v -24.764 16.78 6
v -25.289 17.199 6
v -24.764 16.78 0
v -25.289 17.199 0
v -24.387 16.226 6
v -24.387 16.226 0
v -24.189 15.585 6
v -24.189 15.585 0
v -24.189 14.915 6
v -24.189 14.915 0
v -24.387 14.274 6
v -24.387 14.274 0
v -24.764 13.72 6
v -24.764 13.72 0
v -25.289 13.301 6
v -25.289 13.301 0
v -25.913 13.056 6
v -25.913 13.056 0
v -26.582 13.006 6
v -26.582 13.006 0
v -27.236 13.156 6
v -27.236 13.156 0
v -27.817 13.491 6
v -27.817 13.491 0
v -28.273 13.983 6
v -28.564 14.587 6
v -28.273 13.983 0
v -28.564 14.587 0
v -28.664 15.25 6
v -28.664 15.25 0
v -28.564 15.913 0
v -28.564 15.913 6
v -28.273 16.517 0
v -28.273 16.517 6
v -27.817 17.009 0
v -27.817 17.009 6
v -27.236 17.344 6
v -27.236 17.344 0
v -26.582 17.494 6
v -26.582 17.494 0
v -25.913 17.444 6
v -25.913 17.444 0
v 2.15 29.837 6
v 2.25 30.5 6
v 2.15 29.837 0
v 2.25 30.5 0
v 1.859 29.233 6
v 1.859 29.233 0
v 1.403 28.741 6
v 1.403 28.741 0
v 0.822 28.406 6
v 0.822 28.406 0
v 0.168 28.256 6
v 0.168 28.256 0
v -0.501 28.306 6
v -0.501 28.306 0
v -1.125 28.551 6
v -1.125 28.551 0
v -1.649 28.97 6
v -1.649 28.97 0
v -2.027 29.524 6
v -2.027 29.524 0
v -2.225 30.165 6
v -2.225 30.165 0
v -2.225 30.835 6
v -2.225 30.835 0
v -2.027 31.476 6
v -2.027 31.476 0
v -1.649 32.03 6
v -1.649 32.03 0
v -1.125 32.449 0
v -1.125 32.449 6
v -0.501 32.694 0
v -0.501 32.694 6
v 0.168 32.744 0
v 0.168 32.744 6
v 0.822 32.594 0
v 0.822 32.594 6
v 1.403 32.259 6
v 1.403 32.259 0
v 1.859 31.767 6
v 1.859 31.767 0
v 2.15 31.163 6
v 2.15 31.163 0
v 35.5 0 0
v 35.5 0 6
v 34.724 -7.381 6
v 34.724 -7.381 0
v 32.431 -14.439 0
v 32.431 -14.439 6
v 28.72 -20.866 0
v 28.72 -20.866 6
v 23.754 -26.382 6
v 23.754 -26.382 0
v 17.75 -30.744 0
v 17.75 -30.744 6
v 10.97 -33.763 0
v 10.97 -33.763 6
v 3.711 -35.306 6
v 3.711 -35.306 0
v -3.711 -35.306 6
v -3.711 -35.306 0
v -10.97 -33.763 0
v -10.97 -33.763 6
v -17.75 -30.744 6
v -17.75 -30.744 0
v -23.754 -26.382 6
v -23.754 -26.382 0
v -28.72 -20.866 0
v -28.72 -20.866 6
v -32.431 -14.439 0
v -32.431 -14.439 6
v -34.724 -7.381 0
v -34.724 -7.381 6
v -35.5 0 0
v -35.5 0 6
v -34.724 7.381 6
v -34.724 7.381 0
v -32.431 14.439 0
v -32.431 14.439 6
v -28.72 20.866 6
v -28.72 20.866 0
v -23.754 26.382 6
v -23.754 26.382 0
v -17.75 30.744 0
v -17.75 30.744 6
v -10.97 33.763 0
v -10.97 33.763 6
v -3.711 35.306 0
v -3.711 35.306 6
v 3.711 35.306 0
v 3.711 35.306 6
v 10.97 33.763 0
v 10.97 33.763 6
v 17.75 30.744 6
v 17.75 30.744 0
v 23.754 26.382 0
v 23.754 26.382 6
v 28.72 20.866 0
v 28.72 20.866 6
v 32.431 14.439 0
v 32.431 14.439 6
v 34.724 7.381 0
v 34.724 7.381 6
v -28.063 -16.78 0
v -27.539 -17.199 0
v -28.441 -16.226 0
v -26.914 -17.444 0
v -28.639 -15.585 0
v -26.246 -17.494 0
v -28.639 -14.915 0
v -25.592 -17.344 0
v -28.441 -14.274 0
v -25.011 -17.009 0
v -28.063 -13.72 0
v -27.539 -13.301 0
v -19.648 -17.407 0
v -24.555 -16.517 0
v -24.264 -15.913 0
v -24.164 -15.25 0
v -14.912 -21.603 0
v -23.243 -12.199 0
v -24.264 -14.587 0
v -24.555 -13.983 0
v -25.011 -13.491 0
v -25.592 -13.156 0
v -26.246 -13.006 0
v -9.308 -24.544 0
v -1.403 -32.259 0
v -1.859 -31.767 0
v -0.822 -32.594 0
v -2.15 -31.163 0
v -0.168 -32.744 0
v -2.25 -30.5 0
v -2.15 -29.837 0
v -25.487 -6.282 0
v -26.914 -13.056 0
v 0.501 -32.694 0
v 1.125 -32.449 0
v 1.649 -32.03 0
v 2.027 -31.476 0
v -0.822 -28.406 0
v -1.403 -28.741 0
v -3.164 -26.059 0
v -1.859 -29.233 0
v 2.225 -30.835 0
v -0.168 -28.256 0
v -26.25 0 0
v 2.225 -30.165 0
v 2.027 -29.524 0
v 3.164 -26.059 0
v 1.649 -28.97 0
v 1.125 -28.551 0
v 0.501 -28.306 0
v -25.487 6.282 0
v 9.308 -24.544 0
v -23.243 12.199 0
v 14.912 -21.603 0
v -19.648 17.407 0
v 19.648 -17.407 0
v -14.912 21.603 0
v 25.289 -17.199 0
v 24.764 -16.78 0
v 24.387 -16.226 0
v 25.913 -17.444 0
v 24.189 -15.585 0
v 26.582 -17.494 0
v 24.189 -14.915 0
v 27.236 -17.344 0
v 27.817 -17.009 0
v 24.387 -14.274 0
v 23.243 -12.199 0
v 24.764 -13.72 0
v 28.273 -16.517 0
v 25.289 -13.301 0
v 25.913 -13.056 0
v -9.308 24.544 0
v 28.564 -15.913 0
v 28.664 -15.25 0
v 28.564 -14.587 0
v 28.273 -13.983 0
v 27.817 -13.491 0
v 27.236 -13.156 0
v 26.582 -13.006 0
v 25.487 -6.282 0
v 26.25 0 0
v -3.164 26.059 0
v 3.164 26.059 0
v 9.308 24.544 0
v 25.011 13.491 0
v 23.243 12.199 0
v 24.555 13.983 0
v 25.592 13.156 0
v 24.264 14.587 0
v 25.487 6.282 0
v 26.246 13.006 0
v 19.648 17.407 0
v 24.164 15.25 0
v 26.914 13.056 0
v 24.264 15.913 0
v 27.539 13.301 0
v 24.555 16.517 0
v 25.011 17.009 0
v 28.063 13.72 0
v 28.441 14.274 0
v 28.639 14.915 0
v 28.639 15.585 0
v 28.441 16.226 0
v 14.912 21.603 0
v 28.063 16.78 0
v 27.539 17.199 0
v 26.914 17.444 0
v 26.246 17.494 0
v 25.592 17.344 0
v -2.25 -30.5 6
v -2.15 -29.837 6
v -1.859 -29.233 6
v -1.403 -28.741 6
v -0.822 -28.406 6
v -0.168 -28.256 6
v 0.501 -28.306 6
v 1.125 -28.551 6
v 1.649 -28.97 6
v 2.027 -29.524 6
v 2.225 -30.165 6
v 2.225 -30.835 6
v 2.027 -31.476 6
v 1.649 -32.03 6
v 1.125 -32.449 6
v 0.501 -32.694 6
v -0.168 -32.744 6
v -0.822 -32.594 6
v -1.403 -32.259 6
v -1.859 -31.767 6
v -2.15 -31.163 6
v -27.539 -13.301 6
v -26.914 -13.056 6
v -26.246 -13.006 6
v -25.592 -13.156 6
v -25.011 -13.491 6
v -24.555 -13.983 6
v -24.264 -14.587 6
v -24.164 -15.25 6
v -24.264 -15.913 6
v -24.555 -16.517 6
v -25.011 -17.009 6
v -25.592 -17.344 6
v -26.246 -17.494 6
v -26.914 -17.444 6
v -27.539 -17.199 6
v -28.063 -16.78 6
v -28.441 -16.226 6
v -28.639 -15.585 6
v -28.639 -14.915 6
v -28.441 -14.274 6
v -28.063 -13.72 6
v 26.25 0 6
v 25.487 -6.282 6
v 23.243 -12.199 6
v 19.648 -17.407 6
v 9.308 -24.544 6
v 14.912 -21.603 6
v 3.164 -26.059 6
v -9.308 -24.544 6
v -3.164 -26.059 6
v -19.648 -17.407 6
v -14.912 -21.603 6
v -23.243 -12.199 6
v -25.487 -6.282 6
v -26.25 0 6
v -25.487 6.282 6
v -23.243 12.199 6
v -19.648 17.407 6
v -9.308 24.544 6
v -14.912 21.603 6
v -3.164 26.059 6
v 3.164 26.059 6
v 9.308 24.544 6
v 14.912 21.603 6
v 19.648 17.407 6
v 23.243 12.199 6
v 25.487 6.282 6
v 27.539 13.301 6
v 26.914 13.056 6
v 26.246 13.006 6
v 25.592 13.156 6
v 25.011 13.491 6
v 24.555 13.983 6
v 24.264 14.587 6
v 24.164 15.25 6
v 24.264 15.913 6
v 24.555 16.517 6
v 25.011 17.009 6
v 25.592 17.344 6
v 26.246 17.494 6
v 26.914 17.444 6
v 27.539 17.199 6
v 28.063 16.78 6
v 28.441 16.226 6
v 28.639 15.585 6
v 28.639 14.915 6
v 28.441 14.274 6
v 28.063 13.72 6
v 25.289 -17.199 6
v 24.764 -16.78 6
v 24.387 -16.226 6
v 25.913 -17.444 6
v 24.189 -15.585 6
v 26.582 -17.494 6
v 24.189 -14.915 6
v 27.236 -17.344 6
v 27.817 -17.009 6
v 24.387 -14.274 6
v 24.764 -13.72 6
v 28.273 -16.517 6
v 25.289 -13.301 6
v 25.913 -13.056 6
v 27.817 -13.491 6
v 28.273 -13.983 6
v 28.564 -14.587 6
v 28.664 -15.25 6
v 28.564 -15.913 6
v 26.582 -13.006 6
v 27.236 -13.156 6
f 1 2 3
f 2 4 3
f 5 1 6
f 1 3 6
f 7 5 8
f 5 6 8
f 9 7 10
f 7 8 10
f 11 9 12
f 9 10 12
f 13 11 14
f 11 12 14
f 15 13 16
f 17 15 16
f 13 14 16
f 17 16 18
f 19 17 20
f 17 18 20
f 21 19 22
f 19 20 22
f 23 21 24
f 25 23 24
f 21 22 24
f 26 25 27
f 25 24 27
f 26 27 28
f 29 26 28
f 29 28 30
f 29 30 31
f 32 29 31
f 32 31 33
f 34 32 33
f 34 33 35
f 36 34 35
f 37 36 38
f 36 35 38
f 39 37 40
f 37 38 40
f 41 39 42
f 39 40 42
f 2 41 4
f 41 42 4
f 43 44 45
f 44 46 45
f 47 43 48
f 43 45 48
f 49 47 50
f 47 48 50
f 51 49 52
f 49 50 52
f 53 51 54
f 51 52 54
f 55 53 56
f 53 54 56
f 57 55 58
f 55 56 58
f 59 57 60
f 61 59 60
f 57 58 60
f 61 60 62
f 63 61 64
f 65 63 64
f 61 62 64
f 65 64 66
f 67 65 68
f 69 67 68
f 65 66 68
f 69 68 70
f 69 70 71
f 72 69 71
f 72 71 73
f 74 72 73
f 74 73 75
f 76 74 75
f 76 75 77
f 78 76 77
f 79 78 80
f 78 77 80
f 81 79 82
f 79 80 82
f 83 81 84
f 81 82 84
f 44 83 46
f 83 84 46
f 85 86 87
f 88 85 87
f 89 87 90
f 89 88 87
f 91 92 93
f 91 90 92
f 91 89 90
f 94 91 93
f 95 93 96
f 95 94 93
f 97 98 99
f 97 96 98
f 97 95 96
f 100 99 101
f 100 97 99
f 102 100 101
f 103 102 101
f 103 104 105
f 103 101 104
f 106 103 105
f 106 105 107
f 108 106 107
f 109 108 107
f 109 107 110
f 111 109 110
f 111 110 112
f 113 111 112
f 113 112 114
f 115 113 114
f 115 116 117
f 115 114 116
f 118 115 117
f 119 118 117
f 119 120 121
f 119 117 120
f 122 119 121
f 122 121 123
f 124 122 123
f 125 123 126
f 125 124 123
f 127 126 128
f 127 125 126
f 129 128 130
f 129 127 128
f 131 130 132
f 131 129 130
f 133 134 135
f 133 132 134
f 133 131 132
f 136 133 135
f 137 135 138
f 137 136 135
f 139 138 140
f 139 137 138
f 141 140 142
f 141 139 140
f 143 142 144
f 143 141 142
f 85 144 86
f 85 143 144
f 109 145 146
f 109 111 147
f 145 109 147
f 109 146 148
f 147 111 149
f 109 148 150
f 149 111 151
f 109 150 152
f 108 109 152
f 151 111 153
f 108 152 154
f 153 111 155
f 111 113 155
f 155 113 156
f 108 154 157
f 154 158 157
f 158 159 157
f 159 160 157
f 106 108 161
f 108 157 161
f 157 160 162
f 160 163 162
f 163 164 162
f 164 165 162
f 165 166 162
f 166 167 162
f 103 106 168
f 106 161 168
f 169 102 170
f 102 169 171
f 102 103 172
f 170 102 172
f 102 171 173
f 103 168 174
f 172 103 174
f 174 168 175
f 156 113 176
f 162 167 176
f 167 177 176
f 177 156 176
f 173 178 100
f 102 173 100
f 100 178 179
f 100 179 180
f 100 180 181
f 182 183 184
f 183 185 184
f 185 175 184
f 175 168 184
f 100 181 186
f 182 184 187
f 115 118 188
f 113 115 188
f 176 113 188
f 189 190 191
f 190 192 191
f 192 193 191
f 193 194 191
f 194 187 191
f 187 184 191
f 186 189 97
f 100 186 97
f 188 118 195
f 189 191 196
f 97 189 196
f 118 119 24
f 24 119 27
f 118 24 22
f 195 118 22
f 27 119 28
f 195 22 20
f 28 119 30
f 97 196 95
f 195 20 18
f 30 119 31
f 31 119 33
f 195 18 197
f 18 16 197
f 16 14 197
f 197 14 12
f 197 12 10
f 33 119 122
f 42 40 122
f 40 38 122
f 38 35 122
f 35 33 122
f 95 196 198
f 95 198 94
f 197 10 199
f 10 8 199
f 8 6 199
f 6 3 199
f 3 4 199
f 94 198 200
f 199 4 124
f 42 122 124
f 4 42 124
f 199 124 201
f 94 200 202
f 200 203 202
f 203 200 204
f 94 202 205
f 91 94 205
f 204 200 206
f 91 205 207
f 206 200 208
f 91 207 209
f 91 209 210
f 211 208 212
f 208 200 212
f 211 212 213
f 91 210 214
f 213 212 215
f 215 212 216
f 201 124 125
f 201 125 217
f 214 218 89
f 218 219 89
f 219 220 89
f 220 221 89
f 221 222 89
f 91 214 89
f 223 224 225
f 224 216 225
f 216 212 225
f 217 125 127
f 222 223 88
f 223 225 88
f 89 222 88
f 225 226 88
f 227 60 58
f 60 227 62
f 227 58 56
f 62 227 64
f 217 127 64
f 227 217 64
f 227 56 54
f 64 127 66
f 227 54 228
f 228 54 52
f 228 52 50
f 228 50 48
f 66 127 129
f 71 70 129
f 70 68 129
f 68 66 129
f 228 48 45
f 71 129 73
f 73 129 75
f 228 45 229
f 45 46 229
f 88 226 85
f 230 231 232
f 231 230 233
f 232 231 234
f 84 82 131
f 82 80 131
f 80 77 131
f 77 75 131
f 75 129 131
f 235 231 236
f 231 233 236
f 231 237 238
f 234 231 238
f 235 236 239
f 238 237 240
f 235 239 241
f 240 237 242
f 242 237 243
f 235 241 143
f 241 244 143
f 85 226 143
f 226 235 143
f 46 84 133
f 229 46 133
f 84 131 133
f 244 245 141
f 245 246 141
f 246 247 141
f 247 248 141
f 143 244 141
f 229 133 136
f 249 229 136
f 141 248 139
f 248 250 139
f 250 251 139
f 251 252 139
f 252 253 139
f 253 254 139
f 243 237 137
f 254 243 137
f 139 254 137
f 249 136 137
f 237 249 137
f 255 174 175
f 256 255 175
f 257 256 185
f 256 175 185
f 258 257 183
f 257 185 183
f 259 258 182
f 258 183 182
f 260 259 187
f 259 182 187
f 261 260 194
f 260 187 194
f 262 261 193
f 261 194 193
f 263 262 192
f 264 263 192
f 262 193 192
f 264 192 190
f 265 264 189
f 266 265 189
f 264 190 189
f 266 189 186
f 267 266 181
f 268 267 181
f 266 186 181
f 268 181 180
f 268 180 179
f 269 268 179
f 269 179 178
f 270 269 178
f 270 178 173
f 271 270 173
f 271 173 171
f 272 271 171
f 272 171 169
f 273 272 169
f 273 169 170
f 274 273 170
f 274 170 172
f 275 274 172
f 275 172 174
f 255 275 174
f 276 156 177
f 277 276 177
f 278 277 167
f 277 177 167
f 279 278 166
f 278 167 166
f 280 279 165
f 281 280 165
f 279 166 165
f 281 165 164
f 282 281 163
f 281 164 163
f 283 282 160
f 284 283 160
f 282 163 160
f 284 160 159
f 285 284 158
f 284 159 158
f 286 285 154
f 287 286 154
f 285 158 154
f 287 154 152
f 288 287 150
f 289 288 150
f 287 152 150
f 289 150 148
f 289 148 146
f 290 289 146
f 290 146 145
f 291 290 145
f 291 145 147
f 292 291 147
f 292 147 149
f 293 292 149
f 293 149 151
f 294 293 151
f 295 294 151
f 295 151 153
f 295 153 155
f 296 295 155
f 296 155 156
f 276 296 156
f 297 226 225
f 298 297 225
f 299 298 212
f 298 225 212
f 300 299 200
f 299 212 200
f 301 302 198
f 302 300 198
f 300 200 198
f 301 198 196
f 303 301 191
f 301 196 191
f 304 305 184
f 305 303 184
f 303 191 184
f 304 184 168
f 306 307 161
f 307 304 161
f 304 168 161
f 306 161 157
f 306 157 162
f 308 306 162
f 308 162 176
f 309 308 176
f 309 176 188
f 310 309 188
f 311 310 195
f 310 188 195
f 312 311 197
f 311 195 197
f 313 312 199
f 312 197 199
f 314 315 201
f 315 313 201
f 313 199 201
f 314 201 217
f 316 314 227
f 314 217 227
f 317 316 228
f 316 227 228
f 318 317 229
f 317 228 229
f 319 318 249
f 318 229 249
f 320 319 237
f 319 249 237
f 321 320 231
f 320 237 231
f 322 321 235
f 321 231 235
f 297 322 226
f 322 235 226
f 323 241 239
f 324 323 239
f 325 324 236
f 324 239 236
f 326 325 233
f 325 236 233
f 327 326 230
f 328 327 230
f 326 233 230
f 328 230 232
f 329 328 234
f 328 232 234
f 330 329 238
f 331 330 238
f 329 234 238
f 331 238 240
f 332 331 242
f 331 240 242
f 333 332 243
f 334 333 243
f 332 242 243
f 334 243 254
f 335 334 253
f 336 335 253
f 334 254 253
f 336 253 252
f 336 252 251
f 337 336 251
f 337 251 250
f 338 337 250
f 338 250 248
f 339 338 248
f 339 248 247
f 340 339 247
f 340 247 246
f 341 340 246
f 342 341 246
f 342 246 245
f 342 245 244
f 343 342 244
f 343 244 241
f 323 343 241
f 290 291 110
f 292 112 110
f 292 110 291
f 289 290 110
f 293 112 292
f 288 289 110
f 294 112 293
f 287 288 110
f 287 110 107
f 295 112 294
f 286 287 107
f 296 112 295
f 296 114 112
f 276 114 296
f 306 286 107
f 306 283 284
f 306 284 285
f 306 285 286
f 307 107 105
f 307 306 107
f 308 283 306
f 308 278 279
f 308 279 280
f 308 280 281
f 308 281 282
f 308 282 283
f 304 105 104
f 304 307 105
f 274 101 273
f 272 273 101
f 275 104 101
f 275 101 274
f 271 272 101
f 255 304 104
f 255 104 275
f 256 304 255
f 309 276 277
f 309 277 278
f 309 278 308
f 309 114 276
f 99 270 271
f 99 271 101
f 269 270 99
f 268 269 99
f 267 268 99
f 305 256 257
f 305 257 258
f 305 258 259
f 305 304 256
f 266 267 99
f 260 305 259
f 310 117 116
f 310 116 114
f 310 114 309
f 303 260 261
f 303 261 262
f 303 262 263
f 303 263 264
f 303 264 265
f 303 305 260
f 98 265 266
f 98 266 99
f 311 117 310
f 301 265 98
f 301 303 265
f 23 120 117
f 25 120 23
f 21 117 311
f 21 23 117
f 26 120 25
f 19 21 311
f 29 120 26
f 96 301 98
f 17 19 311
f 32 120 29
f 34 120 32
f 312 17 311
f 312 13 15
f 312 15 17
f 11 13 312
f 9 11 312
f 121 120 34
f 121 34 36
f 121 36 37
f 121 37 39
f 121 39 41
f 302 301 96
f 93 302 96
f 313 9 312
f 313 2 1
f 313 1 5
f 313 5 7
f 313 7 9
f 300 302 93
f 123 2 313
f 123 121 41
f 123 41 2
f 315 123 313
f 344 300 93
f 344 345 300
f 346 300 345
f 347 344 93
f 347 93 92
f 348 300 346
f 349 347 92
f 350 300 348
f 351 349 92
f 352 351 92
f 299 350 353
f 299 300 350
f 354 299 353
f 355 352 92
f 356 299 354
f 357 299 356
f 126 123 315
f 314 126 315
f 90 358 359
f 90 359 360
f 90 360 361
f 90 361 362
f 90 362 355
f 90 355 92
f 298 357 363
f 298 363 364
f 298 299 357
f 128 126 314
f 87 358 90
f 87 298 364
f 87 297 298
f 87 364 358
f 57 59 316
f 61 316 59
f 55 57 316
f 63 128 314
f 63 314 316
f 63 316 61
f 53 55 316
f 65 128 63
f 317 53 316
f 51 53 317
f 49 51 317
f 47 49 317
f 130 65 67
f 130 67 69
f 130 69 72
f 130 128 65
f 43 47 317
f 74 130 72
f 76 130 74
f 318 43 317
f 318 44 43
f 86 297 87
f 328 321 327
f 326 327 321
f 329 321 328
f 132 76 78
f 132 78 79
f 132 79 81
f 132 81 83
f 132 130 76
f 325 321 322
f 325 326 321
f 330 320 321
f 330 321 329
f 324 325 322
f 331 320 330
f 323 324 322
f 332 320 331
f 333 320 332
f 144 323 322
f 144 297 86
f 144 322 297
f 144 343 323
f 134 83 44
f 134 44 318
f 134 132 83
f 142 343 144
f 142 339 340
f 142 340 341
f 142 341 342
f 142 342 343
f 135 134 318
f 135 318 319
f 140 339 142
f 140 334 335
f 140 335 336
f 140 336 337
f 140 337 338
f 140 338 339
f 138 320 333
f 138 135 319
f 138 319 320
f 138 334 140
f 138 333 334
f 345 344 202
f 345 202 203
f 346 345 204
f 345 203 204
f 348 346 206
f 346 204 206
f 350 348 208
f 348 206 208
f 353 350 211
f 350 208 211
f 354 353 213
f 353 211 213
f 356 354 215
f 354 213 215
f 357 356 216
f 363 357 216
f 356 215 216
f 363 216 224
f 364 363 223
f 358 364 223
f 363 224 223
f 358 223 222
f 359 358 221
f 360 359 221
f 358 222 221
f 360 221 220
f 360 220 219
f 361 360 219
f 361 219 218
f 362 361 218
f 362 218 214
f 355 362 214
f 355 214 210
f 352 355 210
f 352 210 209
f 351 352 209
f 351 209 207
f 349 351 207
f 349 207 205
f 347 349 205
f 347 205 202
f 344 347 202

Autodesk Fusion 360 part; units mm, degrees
sketch "Sketch17" plane through (0, 0, 0) normal (0, 0, 1) x (1, 0, 0)
  circle A0 centre (0, 0) radius 26.25
  circle A1 centre (0, 0) radius 35.5
  dimension "d61" = 52.5
  dimension "d62" = 71
extrude "Extrude10" add sketch "Sketch17" along normal blind 6
sketch "Sketch18" plane through (0, 0, 0) normal (0, 0, 1) x (1, 0, 0)
  point P0 (0, 30.5)
sketch "Sketch19" plane through (0, 0, 0) normal (0, 0, 1) x (1, 0, 0)
  circle A0 centre (0, 30.5) radius 2.25
  dimension "d65" = 4.5
extrude "Extrude11" cut sketch "Sketch19" along normal blind 10
pattern_circular "C-Pattern7" count 6 over 360 about axis through (0, 0, 0) along (0, 0, 1) of "Extrude11"
